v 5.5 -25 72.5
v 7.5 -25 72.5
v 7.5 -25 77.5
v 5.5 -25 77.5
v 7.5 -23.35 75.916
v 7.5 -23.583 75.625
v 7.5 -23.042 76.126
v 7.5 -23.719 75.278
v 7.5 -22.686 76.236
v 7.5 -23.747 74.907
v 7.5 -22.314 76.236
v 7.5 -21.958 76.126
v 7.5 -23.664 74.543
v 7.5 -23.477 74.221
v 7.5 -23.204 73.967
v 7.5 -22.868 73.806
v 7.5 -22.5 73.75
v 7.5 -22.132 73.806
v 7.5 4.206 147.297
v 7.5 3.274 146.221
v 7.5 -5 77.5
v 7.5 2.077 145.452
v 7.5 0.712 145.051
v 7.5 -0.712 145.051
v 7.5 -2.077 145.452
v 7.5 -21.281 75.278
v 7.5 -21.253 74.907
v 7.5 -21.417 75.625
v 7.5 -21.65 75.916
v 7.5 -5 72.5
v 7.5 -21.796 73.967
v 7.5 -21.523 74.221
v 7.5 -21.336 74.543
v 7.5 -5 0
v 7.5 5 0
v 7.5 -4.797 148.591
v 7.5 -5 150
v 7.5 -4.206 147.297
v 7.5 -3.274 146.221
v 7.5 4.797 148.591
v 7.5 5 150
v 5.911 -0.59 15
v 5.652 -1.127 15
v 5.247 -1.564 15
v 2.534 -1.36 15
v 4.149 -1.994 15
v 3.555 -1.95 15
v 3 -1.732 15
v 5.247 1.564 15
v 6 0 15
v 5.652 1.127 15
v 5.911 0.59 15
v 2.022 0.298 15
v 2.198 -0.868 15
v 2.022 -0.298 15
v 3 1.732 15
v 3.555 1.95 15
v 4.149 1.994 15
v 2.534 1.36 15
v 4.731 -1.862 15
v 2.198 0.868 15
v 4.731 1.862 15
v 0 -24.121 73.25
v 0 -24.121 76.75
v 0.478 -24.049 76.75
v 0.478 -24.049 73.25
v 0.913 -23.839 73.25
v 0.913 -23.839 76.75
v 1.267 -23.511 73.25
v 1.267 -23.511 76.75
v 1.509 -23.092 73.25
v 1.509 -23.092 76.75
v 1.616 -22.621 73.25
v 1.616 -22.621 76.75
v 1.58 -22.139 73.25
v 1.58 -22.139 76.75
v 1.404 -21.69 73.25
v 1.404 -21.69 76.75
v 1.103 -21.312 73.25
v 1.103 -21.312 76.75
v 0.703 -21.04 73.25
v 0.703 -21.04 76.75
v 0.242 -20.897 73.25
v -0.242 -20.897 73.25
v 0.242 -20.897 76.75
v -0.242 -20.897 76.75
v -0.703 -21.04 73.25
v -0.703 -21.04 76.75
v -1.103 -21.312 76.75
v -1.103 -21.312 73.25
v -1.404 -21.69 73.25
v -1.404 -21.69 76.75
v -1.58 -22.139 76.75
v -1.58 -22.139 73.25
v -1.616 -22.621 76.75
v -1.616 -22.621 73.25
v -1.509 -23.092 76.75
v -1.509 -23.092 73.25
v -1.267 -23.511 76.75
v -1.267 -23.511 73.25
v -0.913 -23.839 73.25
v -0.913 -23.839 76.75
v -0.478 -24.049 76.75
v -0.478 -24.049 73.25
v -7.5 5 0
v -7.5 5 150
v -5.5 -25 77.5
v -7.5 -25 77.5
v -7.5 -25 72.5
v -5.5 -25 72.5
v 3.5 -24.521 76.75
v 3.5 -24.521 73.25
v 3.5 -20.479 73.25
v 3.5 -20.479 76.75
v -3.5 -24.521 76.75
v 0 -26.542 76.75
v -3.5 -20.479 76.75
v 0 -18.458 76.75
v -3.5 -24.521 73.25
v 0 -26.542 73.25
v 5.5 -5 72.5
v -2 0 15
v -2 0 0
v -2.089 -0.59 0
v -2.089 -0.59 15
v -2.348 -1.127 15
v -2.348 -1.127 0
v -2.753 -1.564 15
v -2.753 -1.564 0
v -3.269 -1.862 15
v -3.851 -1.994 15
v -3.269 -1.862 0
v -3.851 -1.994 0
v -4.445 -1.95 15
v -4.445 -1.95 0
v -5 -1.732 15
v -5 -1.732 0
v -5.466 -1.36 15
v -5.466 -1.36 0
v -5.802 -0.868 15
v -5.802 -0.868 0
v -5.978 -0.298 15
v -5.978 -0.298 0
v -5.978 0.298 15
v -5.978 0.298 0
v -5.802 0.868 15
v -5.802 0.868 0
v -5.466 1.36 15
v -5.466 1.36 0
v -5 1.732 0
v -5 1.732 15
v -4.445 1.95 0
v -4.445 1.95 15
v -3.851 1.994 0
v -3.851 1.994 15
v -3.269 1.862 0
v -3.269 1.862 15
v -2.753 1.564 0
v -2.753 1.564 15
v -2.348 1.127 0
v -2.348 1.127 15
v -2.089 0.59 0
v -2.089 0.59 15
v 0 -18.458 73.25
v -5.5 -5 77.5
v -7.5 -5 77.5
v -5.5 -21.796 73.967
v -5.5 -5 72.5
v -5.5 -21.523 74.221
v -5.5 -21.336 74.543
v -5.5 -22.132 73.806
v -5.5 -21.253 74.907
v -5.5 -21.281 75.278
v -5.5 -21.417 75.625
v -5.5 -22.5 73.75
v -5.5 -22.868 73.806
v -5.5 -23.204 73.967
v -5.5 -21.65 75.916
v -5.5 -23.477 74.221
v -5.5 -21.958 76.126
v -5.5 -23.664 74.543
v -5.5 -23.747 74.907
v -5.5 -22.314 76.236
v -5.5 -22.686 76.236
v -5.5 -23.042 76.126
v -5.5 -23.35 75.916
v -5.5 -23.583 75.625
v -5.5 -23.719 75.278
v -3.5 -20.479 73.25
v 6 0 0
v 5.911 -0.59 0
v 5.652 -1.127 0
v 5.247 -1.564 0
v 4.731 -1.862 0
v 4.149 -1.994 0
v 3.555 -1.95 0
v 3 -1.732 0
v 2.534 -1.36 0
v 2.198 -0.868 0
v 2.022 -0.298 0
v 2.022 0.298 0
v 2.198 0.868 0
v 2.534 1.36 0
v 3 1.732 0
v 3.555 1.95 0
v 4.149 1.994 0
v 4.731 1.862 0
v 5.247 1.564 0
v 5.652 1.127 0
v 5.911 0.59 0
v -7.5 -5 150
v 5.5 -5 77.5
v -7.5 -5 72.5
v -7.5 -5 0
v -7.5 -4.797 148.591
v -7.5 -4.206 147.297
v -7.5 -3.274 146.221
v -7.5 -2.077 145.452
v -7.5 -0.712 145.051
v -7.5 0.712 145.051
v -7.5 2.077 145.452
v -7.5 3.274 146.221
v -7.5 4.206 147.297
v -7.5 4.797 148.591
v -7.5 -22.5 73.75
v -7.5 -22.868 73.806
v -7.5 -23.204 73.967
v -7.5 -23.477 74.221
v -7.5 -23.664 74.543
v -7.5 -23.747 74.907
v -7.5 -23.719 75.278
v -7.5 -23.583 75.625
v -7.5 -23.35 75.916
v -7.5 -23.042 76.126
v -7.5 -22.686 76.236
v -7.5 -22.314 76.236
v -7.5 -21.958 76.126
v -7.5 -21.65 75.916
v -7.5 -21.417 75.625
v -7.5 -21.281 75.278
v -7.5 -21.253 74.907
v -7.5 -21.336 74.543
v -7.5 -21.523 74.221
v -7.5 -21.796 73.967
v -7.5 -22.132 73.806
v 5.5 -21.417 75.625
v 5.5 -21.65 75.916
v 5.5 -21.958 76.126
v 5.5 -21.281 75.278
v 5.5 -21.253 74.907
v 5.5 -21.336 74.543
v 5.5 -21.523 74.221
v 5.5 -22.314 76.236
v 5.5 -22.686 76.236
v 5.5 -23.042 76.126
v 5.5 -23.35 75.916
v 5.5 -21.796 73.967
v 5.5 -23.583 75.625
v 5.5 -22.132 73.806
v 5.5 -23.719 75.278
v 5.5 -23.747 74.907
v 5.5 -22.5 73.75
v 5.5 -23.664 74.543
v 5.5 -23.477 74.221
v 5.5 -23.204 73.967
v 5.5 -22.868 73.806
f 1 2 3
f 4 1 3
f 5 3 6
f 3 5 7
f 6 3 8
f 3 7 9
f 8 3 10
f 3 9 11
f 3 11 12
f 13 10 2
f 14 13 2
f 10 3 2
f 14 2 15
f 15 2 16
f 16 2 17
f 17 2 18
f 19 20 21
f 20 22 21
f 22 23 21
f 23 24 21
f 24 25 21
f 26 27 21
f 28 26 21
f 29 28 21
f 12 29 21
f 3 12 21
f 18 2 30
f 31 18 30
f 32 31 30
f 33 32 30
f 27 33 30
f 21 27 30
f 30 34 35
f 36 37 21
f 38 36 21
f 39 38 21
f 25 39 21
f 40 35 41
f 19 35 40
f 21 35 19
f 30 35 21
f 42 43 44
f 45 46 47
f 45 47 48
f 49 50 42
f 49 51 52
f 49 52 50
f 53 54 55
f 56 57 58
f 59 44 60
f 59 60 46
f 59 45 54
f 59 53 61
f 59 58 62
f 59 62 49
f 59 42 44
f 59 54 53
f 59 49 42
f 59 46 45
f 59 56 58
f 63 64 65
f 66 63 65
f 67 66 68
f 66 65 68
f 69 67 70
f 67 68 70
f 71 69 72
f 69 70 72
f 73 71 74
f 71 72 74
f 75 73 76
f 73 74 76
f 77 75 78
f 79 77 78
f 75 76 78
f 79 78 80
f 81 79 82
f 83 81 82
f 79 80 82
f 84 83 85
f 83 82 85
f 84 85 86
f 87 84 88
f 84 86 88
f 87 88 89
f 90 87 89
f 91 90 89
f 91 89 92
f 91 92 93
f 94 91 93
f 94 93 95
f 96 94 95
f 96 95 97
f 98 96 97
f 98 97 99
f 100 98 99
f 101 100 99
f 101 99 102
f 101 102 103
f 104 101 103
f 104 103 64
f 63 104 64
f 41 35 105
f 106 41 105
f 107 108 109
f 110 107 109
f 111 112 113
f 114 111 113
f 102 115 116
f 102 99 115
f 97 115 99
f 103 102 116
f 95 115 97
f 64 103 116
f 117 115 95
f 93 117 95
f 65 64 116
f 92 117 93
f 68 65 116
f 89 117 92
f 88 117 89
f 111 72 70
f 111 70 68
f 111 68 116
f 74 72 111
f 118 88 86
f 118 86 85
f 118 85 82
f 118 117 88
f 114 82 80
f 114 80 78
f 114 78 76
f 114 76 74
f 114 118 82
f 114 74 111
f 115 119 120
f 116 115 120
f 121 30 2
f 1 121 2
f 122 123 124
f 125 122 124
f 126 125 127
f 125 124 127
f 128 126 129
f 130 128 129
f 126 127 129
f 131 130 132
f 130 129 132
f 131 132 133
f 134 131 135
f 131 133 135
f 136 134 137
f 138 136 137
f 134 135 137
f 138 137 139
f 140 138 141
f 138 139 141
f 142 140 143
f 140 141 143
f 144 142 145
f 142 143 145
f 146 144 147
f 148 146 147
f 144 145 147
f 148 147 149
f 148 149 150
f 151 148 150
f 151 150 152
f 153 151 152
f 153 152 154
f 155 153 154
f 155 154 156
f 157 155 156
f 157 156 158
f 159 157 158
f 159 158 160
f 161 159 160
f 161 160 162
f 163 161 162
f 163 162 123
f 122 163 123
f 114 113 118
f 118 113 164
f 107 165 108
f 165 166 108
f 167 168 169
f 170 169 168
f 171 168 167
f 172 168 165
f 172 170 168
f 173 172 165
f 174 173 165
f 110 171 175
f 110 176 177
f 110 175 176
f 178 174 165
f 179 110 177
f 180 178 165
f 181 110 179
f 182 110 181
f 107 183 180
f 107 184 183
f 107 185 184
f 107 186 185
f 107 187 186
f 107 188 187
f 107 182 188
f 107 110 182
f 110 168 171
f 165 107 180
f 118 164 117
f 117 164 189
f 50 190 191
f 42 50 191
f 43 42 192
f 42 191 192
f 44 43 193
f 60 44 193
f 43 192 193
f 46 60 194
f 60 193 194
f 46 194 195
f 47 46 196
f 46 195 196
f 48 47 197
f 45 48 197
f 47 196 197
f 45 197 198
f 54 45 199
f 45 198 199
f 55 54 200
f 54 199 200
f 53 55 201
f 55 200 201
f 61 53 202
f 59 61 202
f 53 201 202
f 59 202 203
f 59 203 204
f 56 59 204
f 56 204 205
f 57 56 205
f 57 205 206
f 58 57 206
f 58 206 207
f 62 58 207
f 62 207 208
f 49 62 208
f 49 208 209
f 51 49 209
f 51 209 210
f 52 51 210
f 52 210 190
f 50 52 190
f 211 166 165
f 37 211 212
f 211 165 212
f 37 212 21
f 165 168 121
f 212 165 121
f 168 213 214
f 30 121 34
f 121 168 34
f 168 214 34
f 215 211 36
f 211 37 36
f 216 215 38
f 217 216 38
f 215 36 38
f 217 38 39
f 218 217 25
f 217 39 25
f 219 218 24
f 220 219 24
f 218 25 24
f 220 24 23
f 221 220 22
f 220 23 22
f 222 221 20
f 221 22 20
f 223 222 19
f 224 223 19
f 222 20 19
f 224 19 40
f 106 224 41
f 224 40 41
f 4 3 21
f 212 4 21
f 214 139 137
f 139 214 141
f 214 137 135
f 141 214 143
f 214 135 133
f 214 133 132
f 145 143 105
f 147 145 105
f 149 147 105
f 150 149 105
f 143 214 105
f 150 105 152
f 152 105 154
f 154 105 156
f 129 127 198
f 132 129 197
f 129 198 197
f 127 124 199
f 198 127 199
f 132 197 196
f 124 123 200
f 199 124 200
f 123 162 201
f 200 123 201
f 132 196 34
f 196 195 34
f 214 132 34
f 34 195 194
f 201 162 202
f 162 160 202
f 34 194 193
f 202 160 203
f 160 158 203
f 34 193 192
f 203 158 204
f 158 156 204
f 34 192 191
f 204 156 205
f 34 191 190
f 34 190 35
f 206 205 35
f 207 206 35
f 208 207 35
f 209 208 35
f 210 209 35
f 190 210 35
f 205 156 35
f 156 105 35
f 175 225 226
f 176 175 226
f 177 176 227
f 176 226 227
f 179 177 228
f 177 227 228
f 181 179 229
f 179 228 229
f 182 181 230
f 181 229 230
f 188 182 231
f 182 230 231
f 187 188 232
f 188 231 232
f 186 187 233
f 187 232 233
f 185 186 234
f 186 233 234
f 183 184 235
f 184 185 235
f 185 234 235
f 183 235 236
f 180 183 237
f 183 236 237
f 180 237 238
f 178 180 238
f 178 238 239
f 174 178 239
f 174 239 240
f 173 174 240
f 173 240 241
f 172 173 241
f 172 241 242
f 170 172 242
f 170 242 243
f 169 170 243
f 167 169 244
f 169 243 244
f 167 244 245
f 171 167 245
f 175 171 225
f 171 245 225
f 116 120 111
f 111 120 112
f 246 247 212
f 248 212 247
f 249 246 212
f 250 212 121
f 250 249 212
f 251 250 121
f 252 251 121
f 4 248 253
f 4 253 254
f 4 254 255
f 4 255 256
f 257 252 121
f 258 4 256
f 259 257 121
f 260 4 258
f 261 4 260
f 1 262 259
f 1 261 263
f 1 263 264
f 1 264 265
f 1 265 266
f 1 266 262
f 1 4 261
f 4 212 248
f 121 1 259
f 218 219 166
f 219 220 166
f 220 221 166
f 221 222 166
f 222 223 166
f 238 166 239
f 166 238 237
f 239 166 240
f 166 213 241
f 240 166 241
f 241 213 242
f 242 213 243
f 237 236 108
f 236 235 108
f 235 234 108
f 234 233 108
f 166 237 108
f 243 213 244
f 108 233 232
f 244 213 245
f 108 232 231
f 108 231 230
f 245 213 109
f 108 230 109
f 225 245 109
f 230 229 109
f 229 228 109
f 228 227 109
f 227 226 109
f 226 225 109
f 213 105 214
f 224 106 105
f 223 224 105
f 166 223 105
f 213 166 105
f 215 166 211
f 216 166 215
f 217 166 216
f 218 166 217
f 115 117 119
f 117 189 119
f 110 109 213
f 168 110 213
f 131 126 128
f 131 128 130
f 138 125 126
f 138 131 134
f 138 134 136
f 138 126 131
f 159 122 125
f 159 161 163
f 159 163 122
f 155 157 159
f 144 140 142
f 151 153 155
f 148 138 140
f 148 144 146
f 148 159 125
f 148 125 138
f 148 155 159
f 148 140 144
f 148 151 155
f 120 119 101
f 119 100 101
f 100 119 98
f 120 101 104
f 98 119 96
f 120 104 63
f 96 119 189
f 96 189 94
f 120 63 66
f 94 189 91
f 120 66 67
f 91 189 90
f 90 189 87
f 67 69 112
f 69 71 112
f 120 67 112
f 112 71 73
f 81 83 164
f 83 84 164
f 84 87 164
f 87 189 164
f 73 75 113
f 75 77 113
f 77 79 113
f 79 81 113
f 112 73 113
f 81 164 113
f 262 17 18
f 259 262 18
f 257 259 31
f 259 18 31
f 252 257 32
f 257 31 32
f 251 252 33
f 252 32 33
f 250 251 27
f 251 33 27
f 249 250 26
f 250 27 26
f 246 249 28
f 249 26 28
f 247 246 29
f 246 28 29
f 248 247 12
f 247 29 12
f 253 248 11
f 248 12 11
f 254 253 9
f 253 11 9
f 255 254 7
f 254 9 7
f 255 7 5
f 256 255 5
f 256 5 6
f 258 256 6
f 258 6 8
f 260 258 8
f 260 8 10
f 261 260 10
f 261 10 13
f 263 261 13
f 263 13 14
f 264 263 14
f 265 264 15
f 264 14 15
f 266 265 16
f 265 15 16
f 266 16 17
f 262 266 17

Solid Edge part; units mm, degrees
sketch "Sketch1" plane through (0, 0, 0) normal (0, 0, 1) x (1, 0, 0)
  line L0 (-7.5, -5) -> (7.5, -5)
  line L1 (7.5, -5) -> (7.5, 5)
  line L2 (7.5, 5) -> (-7.5, 5)
  line L3 (-7.5, 5) -> (-7.5, -5)
extrude "Protrusion1" add sketch "Sketch1" along normal blind 150
sketch "Sketch2" plane through (7.5, 0, 75) normal (1, 0, 0) x (0, 0, -1)
  circle A0 centre (-75, 0) radius 5
extrude "Cutout1" cut sketch "Sketch2" against normal up to next
sketch "Sketch3" plane through (7.5, 0, 75) normal (1, 0, 0) x (0, 0, -1)
  line L0 (0, 5) -> (2.5, 5)
  line L1 (2.5, 5) -> (2.5, -25)
  line L2 (2.5, -25) -> (-2.5, -25)
  line L3 (-2.5, -25) -> (-2.5, 5)
  line L4 (-2.5, 5) -> (0, 5)
extrude "Wyciągnięcie_9" add sketch "Sketch3" against normal blind 2
mirror "Mirror1" about plane through (0, 0, 36.25) normal (1, 0, 0) of "Wyciągnięcie_9"
sketch "Sketch4" plane through (7.5, -10, 75) normal (1, 0, 0) x (0, 0, -1)
  circle A0 centre (0, -12.5) radius 1.25
  dimension "D1" = 2.5
extrude "Cutout2" cut sketch "Sketch4" against normal up to next
mirror "Mirror2" about plane through (0, -10, 75) normal (1, 0, 0) of "Cutout2"
sketch "Sketch5" plane through (-6.5, -15, 75) normal (0, 0, 1) x (0, -1, 0)
  line L0 (9.5207, 3) -> (11.5415, 6.5)
  line L1 (11.5415, 6.5) -> (9.5207, 10)
  line L2 (9.5207, 10) -> (5.4793, 10)
  line L3 (5.4793, 10) -> (3.4585, 6.5)
  line L4 (3.4585, 6.5) -> (5.4793, 3)
  line L5 (5.4793, 3) -> (9.5207, 3)
extrude "Wyciągnięcie_11" add sketch "Sketch5" along normal mid plane 3.5
hole "Otwór_4" at (0, -22.5, 76.75) direction (0, 0, -1) diameter 3.242 end up to next
sketch "Sketch6" plane through (0, 0, 0) normal (0, 0, -1) x (1, 0, 0)
  circle A0 centre (-4, 0) radius 2
  circle A1 centre (4, 0) radius 2
  dimension "D1" = 4
  dimension "D2" = 4
extrude "Wycięcie_10" cut sketch "Sketch6" against normal blind 15
